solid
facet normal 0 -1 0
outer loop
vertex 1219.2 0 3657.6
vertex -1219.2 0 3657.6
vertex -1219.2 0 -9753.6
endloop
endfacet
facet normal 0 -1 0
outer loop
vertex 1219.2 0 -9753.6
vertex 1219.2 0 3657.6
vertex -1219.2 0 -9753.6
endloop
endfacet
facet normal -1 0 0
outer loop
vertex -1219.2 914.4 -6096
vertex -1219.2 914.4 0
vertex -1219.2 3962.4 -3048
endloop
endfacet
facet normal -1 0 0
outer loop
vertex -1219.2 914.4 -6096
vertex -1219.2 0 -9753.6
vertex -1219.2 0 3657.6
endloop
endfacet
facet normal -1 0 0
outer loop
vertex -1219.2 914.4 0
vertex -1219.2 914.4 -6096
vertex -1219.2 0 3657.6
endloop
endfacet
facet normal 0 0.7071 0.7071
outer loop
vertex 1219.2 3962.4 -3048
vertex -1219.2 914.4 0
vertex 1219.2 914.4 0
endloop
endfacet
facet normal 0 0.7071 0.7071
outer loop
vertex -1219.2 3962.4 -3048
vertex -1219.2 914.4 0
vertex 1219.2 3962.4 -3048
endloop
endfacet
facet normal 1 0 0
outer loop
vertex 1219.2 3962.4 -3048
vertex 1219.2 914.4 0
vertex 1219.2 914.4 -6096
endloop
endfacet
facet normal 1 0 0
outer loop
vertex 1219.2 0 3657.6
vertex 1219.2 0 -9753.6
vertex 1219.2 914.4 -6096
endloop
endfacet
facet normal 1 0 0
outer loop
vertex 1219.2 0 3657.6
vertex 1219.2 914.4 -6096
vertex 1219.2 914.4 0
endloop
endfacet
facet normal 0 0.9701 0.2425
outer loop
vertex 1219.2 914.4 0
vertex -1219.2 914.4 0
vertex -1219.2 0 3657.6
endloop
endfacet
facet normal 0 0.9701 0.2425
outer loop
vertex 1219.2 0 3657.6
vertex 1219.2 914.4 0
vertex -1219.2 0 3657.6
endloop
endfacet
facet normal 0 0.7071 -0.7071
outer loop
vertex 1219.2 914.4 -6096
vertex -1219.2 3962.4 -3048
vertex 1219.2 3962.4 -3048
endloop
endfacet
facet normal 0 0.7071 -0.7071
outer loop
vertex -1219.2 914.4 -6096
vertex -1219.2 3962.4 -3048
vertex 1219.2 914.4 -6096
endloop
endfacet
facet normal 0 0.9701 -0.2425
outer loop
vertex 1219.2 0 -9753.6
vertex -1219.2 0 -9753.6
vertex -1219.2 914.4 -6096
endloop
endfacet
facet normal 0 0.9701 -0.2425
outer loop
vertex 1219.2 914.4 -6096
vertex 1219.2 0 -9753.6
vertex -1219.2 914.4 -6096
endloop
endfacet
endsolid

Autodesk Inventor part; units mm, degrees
ref_plane "YZ Plane" through (0, 0, 0) normal (1, 0, 0) x (0, 1, 0)
ref_plane "XZ Plane" through (0, 0, 0) normal (0, 1, 0) x (-1, 0, 0)
ref_plane "XY Plane" through (0, 0, 0) normal (0, 0, 1) x (1, 0, 0)
sketch "Sketch1" plane through (0, 0, 0) normal (1, 0, 0) x (0, 1, 0)
  line L0 (0, 0) -> (914.4, 0)
  line L1 (914.4, 0) -> (0, 3657.6)
  line L2 (0, 3657.6) -> (0, 0)
  line L3 (914.4, 0) -> (3962.4, -3048)
  line L4 (3962.4, -3048) -> (914.4, -3048)
  line L5 (914.4, -3048) -> (914.4, 0)
  line L6 (0, 0) -> (0, -3048)
  line L7 (0, -3048) -> (914.4, -3048)
  dimension "rise" = 914.4
  dimension "run" = 3657.6
  dimension "roofAngle" = 14.036
  dimension "d9" = 45
  dimension "d10" = 3048
extrude "Extrusion1" add sketch "Sketch1" along normal mid plane 2438.4
mirror "Mirror1" about plane through (0, 0, -3048) normal (0, 0, -1) of "Extrusion1"
properties part number "roof" material "PET Plastic"
